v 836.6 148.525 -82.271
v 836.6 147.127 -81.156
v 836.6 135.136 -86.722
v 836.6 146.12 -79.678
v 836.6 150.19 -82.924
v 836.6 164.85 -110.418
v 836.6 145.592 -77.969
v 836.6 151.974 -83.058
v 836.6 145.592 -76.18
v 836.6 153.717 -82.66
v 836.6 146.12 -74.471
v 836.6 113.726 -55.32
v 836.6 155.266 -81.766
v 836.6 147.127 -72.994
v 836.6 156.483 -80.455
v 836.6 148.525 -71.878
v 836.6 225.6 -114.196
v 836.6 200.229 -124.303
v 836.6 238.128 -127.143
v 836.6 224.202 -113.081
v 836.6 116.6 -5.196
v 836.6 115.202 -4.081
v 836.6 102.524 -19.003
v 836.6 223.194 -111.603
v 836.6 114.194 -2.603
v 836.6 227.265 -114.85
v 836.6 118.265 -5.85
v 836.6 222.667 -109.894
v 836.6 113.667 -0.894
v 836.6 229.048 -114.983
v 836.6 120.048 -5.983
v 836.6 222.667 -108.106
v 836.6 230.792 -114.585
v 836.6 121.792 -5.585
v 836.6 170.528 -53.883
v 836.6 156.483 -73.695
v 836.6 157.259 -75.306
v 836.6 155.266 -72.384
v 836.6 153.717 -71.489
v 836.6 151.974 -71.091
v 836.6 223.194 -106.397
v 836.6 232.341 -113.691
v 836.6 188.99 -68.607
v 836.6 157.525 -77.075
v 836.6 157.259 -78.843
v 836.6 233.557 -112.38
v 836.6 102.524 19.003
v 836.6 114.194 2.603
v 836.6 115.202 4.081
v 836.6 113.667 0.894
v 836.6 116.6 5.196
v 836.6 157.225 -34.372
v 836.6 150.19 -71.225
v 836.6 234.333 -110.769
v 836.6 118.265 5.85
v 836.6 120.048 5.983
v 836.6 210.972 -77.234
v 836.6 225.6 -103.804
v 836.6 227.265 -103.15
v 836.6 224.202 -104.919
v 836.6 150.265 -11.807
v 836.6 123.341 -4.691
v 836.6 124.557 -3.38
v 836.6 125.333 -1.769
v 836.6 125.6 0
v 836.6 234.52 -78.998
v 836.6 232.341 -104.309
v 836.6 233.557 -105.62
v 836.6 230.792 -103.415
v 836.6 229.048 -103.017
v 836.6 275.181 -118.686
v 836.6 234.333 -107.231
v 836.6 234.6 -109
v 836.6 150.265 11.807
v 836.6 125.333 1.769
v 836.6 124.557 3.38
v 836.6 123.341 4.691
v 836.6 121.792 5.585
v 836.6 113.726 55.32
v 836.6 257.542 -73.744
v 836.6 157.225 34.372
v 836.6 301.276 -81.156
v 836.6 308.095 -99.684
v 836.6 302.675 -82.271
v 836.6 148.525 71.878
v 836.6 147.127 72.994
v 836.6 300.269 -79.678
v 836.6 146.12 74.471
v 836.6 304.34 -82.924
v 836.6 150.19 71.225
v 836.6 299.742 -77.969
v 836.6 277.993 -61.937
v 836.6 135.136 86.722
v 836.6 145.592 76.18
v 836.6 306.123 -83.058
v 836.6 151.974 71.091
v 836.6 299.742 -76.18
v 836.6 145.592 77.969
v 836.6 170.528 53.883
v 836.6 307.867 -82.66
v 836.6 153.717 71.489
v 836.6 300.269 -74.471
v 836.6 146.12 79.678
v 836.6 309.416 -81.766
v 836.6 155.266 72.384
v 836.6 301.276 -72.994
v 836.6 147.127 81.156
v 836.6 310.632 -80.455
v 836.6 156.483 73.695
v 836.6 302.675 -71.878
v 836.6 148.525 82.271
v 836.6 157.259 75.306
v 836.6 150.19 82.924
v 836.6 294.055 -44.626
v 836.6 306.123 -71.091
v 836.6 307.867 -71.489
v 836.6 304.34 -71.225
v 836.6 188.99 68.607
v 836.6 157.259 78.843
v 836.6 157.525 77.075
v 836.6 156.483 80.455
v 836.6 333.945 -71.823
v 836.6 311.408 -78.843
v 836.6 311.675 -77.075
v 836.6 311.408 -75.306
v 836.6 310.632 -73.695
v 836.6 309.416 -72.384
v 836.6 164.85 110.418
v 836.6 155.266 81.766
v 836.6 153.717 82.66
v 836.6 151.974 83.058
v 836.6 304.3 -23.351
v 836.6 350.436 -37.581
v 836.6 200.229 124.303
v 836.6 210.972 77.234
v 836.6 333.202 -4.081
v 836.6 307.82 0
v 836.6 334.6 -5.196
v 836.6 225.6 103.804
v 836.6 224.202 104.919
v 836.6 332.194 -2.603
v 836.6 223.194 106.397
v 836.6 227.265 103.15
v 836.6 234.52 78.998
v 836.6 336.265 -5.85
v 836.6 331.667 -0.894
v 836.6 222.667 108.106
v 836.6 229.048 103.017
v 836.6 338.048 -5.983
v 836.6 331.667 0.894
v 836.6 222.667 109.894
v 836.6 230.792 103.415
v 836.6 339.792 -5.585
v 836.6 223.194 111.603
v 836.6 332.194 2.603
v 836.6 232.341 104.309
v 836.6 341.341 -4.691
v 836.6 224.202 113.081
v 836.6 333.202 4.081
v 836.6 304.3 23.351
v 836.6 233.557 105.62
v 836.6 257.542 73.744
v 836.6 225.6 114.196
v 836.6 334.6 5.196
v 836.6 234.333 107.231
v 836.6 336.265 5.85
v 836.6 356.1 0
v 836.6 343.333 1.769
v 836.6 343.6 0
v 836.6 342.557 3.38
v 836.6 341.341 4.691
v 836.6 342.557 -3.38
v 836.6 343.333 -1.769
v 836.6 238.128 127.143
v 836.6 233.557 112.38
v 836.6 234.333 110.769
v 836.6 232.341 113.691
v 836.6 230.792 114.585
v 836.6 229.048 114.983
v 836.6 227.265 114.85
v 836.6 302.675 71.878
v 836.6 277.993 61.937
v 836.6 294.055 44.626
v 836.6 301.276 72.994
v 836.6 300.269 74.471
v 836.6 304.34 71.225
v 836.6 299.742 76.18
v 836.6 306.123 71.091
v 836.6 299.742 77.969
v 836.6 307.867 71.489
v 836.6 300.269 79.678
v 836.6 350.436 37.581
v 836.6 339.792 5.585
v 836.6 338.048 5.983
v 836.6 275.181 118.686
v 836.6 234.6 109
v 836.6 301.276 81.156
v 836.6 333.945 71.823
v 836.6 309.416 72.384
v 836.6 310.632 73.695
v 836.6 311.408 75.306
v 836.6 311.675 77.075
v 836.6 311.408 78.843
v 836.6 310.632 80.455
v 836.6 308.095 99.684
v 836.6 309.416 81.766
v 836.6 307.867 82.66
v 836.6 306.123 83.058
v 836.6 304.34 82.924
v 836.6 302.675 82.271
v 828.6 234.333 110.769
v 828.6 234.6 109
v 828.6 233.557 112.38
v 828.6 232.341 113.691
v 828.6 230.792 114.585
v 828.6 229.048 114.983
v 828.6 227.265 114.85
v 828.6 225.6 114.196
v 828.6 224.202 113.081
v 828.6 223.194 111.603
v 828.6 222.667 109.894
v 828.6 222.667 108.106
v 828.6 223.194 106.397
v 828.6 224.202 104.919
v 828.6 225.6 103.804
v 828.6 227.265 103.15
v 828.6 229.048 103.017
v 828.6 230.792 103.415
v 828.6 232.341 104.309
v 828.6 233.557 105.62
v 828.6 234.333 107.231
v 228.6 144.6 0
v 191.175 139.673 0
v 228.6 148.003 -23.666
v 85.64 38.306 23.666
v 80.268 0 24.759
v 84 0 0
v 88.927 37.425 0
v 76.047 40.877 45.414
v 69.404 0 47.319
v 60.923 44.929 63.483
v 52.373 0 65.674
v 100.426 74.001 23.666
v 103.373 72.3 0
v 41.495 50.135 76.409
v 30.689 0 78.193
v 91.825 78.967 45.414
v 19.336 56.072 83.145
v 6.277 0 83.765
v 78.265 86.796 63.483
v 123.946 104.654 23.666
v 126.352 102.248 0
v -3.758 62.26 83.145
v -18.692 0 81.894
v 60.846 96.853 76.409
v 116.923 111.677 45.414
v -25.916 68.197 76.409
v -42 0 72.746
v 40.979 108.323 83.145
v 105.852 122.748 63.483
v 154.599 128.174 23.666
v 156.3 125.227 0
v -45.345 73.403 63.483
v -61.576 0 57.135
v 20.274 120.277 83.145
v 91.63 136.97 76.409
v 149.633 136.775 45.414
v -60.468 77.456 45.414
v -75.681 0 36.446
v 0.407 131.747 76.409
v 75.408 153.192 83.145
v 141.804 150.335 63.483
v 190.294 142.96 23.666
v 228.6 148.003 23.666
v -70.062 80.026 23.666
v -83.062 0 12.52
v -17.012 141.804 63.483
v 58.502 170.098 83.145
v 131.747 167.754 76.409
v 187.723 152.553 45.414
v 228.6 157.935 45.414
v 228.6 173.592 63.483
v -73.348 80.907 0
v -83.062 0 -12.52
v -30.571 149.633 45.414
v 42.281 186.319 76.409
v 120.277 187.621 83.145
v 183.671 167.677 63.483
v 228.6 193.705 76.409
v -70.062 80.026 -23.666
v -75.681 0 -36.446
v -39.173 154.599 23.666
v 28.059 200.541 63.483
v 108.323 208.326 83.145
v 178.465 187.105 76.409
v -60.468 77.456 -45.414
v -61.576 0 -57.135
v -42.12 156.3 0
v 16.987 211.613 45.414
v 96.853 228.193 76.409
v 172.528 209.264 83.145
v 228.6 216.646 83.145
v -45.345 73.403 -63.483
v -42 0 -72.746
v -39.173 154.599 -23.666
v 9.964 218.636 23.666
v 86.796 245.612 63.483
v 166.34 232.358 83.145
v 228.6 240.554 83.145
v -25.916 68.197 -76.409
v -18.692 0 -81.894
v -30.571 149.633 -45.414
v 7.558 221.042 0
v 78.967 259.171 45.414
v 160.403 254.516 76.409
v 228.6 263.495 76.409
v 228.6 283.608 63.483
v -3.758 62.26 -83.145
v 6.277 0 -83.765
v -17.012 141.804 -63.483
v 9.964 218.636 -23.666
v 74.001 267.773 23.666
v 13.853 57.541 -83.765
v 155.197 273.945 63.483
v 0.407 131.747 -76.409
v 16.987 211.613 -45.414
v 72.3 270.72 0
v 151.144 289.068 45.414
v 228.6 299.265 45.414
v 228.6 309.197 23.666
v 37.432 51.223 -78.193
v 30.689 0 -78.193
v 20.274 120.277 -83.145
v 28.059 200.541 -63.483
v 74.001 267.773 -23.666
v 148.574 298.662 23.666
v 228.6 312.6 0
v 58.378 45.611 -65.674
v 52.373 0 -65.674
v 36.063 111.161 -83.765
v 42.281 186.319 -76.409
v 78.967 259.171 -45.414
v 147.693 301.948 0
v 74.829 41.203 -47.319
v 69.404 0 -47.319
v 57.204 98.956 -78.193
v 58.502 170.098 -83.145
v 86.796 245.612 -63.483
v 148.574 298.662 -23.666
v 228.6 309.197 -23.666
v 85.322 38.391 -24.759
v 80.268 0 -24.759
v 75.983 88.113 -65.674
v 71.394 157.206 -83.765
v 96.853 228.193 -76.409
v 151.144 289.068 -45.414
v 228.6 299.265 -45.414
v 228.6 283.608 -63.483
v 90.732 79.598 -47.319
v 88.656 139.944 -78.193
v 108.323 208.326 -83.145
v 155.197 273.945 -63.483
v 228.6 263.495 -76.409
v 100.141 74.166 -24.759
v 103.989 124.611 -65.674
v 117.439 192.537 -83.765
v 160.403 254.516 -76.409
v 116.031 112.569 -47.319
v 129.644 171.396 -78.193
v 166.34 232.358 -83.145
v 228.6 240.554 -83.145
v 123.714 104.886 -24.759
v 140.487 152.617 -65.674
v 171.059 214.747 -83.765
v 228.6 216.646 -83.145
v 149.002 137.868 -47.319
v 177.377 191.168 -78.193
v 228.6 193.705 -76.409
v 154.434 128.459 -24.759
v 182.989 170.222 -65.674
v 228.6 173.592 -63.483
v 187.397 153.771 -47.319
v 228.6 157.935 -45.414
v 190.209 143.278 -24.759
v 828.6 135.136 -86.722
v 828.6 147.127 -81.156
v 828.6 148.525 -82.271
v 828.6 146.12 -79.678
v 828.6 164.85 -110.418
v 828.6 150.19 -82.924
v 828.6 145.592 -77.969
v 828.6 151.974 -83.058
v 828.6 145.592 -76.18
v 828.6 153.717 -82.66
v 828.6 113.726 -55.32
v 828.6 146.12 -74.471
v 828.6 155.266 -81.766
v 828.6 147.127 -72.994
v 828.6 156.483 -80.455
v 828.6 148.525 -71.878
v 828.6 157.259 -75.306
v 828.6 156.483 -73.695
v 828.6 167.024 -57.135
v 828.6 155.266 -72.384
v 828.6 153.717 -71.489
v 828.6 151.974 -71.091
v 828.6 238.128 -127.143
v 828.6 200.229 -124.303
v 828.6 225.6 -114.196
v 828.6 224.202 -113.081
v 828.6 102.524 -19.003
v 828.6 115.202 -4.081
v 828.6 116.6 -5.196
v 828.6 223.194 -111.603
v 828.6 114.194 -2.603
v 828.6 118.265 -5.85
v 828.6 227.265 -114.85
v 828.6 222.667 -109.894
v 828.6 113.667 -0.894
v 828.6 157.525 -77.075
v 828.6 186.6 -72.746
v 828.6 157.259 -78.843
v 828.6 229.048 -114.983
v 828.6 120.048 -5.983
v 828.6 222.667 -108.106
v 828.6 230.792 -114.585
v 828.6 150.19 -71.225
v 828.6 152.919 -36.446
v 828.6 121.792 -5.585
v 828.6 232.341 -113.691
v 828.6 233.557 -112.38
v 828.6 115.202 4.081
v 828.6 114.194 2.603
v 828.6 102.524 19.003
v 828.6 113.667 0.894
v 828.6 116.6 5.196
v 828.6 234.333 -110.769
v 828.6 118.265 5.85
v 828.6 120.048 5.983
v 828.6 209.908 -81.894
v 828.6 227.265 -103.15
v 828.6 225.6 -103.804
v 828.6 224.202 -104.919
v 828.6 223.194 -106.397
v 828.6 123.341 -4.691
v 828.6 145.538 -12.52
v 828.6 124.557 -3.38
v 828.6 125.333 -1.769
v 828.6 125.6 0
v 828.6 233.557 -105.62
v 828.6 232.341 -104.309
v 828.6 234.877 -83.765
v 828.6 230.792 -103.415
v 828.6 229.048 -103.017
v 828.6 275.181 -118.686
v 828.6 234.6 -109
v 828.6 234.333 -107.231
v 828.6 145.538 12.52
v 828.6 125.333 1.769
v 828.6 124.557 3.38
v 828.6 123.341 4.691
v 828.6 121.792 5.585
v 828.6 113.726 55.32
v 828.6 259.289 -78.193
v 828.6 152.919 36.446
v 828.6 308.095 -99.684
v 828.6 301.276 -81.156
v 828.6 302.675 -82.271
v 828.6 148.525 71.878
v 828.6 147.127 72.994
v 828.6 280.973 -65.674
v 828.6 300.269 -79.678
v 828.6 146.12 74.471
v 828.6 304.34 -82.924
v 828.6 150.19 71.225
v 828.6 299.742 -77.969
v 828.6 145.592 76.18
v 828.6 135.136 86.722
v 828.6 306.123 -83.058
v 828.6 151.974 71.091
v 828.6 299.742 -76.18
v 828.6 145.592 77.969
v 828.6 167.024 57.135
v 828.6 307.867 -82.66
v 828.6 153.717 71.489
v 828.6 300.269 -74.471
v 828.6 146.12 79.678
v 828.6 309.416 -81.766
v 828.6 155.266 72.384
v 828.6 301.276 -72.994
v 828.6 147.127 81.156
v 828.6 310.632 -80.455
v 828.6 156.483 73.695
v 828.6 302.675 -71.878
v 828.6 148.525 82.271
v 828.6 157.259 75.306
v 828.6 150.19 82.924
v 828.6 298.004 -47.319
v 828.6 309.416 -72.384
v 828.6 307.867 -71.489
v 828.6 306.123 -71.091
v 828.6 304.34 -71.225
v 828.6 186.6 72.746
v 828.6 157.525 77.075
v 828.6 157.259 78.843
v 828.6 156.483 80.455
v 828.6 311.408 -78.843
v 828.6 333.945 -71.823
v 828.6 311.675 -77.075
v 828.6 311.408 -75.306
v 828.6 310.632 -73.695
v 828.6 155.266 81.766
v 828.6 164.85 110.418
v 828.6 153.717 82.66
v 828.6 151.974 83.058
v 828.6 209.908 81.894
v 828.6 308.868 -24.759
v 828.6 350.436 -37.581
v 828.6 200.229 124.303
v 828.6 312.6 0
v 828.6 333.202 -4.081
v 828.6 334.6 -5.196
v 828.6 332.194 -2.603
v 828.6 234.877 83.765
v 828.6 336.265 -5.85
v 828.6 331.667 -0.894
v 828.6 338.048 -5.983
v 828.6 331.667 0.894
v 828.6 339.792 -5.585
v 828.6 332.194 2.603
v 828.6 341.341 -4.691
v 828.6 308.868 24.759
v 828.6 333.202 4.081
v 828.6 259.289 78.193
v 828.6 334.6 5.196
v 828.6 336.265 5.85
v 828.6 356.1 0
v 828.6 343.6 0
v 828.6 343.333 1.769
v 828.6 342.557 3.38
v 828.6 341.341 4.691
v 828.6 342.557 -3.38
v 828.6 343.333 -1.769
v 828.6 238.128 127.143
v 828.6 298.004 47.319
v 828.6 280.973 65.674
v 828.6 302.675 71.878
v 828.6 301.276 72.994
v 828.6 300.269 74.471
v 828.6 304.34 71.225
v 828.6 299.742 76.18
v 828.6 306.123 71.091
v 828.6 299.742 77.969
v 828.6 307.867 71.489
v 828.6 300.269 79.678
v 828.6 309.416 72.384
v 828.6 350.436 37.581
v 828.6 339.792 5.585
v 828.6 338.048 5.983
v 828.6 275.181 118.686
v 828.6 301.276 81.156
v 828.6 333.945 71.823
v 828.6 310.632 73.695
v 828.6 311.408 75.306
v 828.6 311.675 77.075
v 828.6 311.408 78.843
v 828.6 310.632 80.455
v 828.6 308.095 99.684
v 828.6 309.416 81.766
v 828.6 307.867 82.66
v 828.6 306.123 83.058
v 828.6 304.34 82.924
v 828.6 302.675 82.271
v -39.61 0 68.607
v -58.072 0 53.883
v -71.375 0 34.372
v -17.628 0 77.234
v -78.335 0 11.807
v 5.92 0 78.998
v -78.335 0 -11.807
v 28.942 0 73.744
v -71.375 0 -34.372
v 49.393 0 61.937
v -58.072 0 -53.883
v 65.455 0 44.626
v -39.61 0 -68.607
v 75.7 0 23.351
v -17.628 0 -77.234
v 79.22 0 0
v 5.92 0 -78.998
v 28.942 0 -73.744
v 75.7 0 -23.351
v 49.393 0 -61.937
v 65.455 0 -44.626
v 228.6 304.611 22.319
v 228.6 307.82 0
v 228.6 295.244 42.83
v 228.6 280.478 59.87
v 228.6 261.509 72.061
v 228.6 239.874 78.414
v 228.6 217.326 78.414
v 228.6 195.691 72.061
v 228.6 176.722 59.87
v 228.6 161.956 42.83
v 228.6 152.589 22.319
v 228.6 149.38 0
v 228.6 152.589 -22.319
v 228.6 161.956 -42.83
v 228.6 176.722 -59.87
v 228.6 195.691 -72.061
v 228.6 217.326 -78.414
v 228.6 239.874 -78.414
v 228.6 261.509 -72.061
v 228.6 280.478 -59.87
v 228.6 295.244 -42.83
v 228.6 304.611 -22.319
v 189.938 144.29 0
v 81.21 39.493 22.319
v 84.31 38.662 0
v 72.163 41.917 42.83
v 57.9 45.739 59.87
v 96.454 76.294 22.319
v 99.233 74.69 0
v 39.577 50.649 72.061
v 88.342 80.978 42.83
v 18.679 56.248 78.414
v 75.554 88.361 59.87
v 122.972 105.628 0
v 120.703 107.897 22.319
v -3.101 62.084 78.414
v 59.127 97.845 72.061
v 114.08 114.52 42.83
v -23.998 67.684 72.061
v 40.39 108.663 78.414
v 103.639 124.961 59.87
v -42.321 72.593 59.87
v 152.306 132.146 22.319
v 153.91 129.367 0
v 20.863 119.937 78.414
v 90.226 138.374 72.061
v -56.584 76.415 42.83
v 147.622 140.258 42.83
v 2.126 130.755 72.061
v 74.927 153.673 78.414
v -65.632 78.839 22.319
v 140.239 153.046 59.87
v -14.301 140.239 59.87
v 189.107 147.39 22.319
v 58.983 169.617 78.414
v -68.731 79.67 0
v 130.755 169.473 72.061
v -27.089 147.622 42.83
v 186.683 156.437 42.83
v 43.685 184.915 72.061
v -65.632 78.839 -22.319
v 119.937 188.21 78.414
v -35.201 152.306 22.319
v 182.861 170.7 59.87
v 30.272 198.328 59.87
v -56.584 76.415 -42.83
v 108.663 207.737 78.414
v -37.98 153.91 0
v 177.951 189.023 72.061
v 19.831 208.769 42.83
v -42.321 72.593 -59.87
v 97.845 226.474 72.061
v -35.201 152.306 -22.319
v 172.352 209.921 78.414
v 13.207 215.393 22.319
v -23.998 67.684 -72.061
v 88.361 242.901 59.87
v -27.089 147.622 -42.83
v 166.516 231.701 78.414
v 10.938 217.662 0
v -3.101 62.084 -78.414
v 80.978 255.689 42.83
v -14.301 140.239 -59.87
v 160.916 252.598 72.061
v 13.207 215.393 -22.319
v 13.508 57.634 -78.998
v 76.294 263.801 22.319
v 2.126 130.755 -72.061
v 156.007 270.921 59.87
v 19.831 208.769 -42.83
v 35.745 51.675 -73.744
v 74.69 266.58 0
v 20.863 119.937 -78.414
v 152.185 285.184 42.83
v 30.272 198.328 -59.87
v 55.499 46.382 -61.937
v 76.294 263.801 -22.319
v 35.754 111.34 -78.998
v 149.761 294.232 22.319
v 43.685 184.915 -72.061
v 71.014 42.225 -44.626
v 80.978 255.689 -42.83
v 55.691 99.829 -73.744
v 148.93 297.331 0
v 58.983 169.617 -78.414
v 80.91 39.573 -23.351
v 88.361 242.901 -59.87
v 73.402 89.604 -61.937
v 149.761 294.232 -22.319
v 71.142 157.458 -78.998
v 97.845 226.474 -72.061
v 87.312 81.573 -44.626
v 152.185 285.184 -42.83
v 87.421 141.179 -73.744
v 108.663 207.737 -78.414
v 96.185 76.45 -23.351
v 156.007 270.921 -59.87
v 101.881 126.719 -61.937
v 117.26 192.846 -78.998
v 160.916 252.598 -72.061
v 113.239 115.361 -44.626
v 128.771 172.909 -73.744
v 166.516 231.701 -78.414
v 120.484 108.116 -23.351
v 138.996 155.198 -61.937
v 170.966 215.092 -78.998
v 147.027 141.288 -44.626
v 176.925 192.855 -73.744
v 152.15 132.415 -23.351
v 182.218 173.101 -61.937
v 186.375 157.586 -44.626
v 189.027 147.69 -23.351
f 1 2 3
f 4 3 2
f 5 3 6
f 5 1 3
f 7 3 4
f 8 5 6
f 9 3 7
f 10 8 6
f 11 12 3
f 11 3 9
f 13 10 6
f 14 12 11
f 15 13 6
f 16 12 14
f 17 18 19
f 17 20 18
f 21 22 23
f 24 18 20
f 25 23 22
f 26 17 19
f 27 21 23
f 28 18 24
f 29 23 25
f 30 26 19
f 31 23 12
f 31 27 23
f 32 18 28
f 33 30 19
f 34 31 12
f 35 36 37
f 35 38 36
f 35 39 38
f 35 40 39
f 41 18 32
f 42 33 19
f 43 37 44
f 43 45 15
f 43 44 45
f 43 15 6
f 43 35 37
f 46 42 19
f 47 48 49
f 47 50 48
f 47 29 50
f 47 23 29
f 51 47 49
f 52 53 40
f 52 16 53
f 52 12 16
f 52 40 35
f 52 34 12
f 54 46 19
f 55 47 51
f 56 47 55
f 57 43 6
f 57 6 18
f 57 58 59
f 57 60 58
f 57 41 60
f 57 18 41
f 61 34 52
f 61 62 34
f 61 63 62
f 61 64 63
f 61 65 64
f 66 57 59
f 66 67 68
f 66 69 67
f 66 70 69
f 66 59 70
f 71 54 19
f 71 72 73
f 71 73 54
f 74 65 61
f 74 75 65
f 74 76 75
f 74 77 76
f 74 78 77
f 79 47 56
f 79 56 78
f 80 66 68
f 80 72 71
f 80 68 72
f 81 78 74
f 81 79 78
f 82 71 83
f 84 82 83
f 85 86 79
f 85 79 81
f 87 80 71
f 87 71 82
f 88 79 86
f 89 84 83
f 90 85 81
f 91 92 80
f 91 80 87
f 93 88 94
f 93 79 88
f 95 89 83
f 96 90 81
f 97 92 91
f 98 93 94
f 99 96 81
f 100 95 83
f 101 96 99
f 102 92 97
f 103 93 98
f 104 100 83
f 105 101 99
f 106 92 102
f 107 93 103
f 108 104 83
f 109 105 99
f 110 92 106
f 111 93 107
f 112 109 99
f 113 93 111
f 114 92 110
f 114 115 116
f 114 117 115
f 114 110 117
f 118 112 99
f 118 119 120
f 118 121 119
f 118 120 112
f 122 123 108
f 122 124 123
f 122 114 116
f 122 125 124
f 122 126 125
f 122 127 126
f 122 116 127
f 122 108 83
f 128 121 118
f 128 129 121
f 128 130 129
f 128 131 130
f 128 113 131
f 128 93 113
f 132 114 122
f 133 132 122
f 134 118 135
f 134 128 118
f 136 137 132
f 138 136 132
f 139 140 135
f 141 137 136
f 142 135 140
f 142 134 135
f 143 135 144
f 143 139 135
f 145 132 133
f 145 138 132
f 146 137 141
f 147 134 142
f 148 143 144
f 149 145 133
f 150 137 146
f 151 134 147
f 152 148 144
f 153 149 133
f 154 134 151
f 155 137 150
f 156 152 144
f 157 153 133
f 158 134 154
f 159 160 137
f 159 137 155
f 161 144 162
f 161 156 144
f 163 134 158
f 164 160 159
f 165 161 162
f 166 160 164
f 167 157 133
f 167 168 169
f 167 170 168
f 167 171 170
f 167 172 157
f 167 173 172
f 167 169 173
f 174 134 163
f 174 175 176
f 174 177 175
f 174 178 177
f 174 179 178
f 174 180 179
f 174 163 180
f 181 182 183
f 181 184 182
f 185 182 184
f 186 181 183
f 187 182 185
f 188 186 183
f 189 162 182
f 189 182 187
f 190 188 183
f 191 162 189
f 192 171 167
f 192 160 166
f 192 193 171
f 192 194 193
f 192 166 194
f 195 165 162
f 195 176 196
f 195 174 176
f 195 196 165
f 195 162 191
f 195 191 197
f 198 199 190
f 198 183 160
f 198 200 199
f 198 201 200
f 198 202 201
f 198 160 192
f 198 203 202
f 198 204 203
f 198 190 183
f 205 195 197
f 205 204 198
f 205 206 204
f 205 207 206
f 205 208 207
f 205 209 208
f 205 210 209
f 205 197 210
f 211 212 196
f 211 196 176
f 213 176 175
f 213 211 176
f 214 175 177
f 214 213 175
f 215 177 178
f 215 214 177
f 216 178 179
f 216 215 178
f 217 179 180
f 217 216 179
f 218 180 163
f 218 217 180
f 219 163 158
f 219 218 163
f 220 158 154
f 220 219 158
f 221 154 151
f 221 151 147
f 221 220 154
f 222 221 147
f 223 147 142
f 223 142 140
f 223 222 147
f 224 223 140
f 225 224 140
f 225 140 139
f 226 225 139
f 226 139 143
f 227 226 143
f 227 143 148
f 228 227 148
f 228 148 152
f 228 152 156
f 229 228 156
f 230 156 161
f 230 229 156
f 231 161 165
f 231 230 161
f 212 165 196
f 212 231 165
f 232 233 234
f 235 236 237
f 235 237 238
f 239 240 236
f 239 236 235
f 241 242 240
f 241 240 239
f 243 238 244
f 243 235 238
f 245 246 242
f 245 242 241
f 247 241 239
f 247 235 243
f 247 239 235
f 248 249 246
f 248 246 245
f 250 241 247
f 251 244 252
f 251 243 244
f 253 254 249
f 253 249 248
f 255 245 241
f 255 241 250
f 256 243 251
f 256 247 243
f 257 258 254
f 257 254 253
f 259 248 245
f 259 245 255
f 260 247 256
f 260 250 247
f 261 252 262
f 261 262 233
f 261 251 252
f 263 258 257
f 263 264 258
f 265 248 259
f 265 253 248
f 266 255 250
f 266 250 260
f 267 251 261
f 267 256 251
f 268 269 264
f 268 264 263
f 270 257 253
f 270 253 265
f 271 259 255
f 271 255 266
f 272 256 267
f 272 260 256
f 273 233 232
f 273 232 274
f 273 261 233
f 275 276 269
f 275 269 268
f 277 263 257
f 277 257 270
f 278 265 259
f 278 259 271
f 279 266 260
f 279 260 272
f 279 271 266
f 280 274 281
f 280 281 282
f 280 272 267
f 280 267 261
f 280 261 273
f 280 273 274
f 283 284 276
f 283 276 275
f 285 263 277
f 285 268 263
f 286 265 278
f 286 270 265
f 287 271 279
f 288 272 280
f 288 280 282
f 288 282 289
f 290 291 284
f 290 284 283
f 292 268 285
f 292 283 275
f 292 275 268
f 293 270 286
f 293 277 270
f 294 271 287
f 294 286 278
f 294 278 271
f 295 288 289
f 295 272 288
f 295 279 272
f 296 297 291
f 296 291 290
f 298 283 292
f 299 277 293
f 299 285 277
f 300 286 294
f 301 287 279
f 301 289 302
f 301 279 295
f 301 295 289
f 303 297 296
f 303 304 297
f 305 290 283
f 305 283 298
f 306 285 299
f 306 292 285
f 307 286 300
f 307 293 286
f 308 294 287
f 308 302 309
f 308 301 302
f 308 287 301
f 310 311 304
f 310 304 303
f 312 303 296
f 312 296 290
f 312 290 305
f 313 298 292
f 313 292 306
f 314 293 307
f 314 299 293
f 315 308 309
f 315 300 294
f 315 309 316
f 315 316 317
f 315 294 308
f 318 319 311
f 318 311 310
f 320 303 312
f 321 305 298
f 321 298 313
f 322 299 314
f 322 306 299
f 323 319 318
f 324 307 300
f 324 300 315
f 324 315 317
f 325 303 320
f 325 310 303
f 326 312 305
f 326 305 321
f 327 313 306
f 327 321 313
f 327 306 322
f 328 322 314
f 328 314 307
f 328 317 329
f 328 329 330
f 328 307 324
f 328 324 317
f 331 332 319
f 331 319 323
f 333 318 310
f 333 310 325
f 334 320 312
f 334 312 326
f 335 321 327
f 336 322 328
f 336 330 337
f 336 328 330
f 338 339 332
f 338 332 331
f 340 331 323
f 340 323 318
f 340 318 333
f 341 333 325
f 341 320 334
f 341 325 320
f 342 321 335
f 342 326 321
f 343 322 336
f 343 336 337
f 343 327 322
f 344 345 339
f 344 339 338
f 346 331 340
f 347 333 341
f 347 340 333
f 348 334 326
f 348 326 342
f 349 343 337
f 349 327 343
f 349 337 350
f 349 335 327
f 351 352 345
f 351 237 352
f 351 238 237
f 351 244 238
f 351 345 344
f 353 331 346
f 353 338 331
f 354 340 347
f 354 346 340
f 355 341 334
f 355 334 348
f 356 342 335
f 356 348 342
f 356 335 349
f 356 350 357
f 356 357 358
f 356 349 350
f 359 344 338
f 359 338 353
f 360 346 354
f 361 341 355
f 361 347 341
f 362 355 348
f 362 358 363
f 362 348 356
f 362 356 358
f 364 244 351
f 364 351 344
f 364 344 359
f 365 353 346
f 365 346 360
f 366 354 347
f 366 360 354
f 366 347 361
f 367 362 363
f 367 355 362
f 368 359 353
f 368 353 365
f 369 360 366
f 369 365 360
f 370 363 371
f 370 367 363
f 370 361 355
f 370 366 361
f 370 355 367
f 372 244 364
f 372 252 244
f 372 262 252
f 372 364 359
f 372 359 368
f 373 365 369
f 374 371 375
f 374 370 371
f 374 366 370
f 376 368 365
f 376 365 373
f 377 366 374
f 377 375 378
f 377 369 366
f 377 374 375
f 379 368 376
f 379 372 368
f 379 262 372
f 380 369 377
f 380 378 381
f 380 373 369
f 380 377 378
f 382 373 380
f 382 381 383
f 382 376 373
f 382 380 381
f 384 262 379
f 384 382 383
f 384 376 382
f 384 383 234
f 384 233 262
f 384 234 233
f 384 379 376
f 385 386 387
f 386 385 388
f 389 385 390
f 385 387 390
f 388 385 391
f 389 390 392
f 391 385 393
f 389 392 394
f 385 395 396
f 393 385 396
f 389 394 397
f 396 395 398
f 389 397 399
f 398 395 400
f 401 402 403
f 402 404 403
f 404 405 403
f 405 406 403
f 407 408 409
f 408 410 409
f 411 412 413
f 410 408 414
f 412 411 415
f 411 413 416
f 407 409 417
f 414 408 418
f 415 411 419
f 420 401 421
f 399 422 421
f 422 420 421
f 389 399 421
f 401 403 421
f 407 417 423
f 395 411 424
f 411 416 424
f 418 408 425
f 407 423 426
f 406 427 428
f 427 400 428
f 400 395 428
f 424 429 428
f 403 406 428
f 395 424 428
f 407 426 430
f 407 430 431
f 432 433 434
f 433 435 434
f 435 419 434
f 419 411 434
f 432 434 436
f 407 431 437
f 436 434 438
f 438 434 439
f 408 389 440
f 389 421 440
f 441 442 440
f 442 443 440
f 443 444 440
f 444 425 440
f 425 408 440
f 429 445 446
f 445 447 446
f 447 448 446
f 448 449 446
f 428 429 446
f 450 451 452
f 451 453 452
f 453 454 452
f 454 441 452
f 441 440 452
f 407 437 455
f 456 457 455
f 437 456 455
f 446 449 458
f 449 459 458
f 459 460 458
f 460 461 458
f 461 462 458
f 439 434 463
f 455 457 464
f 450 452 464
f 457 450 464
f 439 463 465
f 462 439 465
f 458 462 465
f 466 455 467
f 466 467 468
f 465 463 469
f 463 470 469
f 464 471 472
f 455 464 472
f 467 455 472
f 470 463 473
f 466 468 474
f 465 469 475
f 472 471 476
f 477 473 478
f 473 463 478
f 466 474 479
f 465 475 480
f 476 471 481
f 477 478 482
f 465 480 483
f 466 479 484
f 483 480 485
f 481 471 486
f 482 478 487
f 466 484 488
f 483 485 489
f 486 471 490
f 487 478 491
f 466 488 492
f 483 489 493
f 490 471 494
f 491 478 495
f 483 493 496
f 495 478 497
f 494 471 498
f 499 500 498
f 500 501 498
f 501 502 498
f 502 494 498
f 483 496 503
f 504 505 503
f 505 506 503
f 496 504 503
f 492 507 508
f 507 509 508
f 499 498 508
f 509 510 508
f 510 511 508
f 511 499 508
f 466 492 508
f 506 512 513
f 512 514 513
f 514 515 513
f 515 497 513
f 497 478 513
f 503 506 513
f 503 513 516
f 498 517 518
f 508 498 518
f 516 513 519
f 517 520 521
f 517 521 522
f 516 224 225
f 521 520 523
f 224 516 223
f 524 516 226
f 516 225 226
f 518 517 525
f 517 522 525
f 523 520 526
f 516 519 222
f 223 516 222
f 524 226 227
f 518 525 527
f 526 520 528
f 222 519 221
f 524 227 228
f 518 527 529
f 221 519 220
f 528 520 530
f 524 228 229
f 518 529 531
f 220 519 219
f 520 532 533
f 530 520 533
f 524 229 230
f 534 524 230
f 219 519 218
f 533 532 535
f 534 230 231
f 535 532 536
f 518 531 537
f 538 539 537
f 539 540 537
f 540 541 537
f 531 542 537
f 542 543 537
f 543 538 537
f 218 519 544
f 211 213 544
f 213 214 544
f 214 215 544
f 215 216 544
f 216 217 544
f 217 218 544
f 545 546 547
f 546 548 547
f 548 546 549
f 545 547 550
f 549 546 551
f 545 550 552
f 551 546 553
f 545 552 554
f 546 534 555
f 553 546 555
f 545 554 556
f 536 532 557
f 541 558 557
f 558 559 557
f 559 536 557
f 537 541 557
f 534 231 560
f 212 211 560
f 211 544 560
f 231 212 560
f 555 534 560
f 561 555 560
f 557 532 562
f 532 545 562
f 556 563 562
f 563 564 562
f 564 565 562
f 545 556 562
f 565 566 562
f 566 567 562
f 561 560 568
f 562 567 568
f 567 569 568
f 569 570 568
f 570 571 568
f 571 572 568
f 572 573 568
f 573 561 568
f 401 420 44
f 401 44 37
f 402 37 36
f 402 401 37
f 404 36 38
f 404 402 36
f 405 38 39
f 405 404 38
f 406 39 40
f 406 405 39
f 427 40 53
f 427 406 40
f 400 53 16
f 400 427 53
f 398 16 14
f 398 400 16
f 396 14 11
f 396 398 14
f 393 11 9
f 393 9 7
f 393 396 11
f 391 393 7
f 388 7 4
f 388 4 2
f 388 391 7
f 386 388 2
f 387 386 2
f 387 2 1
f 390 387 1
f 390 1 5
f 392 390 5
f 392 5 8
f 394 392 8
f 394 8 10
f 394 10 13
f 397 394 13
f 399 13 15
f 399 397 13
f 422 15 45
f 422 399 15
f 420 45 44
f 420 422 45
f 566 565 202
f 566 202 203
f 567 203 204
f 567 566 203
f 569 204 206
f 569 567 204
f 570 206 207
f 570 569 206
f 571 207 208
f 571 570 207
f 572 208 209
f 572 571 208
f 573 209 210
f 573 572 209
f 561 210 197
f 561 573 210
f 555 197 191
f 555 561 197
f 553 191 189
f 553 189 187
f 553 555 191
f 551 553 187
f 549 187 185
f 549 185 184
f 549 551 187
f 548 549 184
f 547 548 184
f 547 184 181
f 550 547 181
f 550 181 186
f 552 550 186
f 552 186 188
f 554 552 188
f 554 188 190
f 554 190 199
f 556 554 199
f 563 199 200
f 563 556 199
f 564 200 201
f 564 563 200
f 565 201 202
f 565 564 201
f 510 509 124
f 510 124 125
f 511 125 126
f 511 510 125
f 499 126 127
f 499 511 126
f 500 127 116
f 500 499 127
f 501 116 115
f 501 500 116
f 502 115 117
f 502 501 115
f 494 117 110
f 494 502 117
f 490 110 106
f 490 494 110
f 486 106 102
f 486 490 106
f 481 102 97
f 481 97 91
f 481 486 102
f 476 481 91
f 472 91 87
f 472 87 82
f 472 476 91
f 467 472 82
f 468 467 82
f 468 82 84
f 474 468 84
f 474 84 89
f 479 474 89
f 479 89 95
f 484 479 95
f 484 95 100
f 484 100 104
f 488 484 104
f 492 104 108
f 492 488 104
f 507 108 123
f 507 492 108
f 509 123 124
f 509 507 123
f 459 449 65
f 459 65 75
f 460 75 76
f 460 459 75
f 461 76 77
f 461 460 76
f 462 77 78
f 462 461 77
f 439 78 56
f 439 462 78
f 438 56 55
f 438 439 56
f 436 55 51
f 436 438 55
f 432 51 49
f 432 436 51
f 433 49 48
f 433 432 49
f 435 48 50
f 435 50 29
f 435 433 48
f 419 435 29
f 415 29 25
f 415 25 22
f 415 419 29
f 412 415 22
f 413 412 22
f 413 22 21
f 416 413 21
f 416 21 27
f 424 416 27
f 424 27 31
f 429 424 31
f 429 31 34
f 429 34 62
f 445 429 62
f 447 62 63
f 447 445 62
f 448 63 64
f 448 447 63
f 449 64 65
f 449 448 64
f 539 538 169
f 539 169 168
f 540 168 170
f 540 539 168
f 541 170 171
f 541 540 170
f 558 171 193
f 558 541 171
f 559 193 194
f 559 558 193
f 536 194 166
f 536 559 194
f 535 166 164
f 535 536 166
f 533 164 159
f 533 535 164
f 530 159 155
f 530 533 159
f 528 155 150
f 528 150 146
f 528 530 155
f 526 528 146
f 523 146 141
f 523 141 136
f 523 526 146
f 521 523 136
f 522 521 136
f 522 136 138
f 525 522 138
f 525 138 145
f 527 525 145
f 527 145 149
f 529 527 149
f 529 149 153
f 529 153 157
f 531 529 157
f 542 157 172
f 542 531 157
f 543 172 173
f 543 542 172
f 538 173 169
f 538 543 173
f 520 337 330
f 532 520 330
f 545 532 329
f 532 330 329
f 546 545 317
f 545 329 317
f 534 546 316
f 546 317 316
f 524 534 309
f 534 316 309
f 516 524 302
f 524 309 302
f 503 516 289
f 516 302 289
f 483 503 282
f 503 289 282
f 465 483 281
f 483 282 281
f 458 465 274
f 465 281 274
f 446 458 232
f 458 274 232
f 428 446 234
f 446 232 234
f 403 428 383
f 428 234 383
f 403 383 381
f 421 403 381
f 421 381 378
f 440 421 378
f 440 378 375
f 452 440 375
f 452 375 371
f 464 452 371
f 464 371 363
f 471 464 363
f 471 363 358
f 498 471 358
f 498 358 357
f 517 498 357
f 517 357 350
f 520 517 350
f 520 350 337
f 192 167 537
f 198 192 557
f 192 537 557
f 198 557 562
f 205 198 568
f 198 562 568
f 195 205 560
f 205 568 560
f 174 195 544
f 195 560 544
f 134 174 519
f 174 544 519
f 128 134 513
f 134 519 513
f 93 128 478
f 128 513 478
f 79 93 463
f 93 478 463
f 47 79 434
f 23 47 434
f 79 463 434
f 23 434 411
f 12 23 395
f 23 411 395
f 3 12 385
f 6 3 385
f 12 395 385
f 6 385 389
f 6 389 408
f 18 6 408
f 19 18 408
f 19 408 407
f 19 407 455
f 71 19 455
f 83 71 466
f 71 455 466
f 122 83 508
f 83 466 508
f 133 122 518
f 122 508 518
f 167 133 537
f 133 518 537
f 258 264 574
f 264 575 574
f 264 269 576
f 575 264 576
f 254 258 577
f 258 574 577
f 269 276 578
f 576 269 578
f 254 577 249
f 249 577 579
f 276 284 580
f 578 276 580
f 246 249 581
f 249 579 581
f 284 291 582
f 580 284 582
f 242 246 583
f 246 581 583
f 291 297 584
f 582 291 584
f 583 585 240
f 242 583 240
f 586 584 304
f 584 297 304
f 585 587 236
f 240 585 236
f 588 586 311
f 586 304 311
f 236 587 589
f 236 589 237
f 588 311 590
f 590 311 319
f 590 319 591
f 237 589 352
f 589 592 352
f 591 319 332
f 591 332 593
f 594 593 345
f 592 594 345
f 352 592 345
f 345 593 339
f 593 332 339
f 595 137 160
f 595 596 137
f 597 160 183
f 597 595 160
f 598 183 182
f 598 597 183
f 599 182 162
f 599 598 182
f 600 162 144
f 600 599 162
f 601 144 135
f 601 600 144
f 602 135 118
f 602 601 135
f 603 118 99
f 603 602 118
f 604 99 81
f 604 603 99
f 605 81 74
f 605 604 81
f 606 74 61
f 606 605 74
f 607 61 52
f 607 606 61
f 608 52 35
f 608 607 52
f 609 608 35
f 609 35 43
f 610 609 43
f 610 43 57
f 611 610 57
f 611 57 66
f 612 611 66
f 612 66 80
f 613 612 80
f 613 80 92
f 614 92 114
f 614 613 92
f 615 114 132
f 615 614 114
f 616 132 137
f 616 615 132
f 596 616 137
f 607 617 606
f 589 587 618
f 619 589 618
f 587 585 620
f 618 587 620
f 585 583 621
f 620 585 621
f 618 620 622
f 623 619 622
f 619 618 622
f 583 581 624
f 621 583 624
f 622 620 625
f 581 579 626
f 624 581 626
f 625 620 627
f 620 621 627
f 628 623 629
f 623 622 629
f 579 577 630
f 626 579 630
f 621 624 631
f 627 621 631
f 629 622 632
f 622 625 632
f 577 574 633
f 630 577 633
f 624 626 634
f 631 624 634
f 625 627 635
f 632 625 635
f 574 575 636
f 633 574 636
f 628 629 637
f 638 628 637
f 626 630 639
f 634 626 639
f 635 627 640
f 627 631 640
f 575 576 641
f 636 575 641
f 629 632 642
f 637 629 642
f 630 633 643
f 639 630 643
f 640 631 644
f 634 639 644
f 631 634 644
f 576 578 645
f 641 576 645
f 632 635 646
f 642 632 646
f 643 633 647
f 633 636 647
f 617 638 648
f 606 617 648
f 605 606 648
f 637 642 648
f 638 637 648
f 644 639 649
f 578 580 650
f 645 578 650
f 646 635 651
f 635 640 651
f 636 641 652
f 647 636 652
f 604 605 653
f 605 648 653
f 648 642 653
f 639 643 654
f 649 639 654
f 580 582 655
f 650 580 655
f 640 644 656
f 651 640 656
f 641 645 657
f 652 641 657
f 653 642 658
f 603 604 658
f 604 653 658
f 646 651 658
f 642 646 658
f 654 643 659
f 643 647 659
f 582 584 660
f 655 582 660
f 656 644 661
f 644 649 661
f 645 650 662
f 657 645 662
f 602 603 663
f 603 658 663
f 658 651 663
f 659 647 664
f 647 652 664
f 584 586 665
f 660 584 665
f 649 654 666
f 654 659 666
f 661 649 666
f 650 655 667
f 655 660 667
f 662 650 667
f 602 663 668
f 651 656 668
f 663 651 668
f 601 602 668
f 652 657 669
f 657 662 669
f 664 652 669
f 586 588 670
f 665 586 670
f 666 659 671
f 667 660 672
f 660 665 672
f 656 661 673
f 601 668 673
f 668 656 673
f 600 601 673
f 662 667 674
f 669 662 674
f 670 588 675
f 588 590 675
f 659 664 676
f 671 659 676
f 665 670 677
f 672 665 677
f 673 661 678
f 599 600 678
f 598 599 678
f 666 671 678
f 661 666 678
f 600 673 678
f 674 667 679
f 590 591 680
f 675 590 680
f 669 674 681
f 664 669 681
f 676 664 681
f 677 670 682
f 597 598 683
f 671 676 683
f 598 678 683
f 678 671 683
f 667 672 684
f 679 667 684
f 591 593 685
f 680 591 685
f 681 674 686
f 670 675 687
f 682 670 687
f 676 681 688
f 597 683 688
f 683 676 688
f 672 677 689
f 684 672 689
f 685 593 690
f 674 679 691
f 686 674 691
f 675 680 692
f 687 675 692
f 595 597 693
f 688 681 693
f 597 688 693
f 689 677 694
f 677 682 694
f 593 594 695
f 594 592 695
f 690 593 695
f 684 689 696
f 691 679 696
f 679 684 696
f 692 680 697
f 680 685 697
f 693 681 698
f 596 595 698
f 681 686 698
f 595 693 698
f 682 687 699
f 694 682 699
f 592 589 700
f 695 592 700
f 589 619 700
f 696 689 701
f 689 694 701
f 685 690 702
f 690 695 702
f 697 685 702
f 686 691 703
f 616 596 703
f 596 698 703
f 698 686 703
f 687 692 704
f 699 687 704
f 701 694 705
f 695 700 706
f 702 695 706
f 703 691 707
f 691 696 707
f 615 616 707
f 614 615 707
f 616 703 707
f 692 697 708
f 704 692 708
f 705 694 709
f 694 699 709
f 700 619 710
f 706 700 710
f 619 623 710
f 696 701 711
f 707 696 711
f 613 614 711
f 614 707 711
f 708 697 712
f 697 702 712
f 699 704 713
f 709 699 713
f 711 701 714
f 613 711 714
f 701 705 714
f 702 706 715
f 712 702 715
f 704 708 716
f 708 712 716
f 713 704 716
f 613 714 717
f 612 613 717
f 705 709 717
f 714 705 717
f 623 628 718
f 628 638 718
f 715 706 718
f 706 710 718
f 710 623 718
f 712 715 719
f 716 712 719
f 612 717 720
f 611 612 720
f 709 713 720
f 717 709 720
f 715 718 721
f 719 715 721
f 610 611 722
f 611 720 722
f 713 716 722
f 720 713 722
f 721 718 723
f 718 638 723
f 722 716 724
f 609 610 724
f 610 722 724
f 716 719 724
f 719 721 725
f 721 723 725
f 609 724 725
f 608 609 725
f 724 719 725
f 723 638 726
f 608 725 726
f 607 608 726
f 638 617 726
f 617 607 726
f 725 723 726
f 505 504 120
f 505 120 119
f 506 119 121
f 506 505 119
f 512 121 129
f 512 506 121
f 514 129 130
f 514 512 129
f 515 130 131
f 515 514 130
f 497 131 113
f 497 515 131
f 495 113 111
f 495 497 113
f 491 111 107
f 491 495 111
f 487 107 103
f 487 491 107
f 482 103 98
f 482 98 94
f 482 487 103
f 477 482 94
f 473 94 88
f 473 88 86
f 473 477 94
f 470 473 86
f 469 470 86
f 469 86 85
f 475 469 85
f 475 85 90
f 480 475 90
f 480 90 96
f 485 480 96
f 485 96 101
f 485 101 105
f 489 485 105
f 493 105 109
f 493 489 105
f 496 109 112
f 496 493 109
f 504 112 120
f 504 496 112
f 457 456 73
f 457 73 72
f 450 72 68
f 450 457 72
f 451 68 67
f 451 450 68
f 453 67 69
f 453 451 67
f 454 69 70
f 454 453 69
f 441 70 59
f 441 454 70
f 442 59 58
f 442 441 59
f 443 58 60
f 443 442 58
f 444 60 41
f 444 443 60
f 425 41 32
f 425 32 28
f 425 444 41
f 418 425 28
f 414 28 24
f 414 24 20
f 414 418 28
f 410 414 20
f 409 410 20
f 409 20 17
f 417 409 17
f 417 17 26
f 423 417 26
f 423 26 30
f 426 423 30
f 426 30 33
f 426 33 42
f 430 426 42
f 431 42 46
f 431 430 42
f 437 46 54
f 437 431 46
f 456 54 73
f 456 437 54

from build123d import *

# Parameters (mm, degrees)
SKETCH1_R           = 84
SKETCH1_R_2         = 79.22
SKETCH3_R           = 84
SKETCH3_R_2         = 79.22
BOSS_EXTRUDE1_DEPTH = 600
SKETCH4_R           = 127.5
SKETCH4_R_2         = 79.22
SKETCH4_R_3         = 6
BOSS_EXTRUDE2_DEPTH = 8


with BuildPart() as part:
    # Sweep1: sweep along a path in Sketch2
    with BuildLine(Plane.XY) as sweep1_path:
        ThreePointArc((0, 0), (66.955389821, 161.644610179), (228.6, 228.6))
    # Sketch1 → Sweep1 (sweep)
    with BuildSketch(Plane(origin=(0, 0, 0), x_dir=(1, 0, 0), z_dir=(0, 1, 0))):
        Circle(SKETCH1_R)
        Circle(SKETCH1_R_2, mode=Mode.SUBTRACT)
    sweep(path=sweep1_path.line)

    # Sketch3 → Boss-Extrude1 (add)
    with BuildSketch(Plane(origin=(228.6, 0, 0), x_dir=(0, 0, -1), z_dir=(1, 0, 0))):
        with Locations(Location((0, 228.6, 0), (0, 0, 90))):
            Circle(SKETCH3_R)
        with Locations(Location((0, 228.6, 0), (0, 0, 90))):
            Circle(SKETCH3_R_2, mode=Mode.SUBTRACT)
    extrude(amount=BOSS_EXTRUDE1_DEPTH)

    # Sketch4 → Boss-Extrude2 (add)
    with BuildSketch(Plane(origin=(828.6, 0, 0), x_dir=(0, 0, -1), z_dir=(1, 0, 0))):
        with Locations(Location((0, 228.6, 0), (0, 0, 90))):
            Circle(SKETCH4_R)
        with Locations(Location((0, 228.6, 0), (0, 0, 90))):
            Circle(SKETCH4_R_2, mode=Mode.SUBTRACT)
        with Locations(Location((0, 337.6, 0), (0, 0, 90))):
            Circle(SKETCH4_R_3, mode=Mode.SUBTRACT)
        with Locations(Location((77.074639149, 305.674639149, 0), (0, 0, 90))):
            Circle(SKETCH4_R_3, mode=Mode.SUBTRACT)
        with Locations(Location((109, 228.6, 0), (0, 0, 90))):
            Circle(SKETCH4_R_3, mode=Mode.SUBTRACT)
        with Locations(Location((77.074639149, 151.525360851, 0), (0, 0, 90))):
            Circle(SKETCH4_R_3, mode=Mode.SUBTRACT)
        with Locations(Location((0, 119.6, 0), (0, 0, 90))):
            Circle(SKETCH4_R_3, mode=Mode.SUBTRACT)
        with Locations(Location((-77.074639149, 151.525360851, 0), (0, 0, 90))):
            Circle(SKETCH4_R_3, mode=Mode.SUBTRACT)
        with Locations(Location((-109, 228.6, 0), (0, 0, 90))):
            Circle(SKETCH4_R_3, mode=Mode.SUBTRACT)
        with Locations(Location((-77.074639149, 305.674639149, 0), (0, 0, 90))):
            Circle(SKETCH4_R_3, mode=Mode.SUBTRACT)
    extrude(amount=BOSS_EXTRUDE2_DEPTH)


solid = part.part
